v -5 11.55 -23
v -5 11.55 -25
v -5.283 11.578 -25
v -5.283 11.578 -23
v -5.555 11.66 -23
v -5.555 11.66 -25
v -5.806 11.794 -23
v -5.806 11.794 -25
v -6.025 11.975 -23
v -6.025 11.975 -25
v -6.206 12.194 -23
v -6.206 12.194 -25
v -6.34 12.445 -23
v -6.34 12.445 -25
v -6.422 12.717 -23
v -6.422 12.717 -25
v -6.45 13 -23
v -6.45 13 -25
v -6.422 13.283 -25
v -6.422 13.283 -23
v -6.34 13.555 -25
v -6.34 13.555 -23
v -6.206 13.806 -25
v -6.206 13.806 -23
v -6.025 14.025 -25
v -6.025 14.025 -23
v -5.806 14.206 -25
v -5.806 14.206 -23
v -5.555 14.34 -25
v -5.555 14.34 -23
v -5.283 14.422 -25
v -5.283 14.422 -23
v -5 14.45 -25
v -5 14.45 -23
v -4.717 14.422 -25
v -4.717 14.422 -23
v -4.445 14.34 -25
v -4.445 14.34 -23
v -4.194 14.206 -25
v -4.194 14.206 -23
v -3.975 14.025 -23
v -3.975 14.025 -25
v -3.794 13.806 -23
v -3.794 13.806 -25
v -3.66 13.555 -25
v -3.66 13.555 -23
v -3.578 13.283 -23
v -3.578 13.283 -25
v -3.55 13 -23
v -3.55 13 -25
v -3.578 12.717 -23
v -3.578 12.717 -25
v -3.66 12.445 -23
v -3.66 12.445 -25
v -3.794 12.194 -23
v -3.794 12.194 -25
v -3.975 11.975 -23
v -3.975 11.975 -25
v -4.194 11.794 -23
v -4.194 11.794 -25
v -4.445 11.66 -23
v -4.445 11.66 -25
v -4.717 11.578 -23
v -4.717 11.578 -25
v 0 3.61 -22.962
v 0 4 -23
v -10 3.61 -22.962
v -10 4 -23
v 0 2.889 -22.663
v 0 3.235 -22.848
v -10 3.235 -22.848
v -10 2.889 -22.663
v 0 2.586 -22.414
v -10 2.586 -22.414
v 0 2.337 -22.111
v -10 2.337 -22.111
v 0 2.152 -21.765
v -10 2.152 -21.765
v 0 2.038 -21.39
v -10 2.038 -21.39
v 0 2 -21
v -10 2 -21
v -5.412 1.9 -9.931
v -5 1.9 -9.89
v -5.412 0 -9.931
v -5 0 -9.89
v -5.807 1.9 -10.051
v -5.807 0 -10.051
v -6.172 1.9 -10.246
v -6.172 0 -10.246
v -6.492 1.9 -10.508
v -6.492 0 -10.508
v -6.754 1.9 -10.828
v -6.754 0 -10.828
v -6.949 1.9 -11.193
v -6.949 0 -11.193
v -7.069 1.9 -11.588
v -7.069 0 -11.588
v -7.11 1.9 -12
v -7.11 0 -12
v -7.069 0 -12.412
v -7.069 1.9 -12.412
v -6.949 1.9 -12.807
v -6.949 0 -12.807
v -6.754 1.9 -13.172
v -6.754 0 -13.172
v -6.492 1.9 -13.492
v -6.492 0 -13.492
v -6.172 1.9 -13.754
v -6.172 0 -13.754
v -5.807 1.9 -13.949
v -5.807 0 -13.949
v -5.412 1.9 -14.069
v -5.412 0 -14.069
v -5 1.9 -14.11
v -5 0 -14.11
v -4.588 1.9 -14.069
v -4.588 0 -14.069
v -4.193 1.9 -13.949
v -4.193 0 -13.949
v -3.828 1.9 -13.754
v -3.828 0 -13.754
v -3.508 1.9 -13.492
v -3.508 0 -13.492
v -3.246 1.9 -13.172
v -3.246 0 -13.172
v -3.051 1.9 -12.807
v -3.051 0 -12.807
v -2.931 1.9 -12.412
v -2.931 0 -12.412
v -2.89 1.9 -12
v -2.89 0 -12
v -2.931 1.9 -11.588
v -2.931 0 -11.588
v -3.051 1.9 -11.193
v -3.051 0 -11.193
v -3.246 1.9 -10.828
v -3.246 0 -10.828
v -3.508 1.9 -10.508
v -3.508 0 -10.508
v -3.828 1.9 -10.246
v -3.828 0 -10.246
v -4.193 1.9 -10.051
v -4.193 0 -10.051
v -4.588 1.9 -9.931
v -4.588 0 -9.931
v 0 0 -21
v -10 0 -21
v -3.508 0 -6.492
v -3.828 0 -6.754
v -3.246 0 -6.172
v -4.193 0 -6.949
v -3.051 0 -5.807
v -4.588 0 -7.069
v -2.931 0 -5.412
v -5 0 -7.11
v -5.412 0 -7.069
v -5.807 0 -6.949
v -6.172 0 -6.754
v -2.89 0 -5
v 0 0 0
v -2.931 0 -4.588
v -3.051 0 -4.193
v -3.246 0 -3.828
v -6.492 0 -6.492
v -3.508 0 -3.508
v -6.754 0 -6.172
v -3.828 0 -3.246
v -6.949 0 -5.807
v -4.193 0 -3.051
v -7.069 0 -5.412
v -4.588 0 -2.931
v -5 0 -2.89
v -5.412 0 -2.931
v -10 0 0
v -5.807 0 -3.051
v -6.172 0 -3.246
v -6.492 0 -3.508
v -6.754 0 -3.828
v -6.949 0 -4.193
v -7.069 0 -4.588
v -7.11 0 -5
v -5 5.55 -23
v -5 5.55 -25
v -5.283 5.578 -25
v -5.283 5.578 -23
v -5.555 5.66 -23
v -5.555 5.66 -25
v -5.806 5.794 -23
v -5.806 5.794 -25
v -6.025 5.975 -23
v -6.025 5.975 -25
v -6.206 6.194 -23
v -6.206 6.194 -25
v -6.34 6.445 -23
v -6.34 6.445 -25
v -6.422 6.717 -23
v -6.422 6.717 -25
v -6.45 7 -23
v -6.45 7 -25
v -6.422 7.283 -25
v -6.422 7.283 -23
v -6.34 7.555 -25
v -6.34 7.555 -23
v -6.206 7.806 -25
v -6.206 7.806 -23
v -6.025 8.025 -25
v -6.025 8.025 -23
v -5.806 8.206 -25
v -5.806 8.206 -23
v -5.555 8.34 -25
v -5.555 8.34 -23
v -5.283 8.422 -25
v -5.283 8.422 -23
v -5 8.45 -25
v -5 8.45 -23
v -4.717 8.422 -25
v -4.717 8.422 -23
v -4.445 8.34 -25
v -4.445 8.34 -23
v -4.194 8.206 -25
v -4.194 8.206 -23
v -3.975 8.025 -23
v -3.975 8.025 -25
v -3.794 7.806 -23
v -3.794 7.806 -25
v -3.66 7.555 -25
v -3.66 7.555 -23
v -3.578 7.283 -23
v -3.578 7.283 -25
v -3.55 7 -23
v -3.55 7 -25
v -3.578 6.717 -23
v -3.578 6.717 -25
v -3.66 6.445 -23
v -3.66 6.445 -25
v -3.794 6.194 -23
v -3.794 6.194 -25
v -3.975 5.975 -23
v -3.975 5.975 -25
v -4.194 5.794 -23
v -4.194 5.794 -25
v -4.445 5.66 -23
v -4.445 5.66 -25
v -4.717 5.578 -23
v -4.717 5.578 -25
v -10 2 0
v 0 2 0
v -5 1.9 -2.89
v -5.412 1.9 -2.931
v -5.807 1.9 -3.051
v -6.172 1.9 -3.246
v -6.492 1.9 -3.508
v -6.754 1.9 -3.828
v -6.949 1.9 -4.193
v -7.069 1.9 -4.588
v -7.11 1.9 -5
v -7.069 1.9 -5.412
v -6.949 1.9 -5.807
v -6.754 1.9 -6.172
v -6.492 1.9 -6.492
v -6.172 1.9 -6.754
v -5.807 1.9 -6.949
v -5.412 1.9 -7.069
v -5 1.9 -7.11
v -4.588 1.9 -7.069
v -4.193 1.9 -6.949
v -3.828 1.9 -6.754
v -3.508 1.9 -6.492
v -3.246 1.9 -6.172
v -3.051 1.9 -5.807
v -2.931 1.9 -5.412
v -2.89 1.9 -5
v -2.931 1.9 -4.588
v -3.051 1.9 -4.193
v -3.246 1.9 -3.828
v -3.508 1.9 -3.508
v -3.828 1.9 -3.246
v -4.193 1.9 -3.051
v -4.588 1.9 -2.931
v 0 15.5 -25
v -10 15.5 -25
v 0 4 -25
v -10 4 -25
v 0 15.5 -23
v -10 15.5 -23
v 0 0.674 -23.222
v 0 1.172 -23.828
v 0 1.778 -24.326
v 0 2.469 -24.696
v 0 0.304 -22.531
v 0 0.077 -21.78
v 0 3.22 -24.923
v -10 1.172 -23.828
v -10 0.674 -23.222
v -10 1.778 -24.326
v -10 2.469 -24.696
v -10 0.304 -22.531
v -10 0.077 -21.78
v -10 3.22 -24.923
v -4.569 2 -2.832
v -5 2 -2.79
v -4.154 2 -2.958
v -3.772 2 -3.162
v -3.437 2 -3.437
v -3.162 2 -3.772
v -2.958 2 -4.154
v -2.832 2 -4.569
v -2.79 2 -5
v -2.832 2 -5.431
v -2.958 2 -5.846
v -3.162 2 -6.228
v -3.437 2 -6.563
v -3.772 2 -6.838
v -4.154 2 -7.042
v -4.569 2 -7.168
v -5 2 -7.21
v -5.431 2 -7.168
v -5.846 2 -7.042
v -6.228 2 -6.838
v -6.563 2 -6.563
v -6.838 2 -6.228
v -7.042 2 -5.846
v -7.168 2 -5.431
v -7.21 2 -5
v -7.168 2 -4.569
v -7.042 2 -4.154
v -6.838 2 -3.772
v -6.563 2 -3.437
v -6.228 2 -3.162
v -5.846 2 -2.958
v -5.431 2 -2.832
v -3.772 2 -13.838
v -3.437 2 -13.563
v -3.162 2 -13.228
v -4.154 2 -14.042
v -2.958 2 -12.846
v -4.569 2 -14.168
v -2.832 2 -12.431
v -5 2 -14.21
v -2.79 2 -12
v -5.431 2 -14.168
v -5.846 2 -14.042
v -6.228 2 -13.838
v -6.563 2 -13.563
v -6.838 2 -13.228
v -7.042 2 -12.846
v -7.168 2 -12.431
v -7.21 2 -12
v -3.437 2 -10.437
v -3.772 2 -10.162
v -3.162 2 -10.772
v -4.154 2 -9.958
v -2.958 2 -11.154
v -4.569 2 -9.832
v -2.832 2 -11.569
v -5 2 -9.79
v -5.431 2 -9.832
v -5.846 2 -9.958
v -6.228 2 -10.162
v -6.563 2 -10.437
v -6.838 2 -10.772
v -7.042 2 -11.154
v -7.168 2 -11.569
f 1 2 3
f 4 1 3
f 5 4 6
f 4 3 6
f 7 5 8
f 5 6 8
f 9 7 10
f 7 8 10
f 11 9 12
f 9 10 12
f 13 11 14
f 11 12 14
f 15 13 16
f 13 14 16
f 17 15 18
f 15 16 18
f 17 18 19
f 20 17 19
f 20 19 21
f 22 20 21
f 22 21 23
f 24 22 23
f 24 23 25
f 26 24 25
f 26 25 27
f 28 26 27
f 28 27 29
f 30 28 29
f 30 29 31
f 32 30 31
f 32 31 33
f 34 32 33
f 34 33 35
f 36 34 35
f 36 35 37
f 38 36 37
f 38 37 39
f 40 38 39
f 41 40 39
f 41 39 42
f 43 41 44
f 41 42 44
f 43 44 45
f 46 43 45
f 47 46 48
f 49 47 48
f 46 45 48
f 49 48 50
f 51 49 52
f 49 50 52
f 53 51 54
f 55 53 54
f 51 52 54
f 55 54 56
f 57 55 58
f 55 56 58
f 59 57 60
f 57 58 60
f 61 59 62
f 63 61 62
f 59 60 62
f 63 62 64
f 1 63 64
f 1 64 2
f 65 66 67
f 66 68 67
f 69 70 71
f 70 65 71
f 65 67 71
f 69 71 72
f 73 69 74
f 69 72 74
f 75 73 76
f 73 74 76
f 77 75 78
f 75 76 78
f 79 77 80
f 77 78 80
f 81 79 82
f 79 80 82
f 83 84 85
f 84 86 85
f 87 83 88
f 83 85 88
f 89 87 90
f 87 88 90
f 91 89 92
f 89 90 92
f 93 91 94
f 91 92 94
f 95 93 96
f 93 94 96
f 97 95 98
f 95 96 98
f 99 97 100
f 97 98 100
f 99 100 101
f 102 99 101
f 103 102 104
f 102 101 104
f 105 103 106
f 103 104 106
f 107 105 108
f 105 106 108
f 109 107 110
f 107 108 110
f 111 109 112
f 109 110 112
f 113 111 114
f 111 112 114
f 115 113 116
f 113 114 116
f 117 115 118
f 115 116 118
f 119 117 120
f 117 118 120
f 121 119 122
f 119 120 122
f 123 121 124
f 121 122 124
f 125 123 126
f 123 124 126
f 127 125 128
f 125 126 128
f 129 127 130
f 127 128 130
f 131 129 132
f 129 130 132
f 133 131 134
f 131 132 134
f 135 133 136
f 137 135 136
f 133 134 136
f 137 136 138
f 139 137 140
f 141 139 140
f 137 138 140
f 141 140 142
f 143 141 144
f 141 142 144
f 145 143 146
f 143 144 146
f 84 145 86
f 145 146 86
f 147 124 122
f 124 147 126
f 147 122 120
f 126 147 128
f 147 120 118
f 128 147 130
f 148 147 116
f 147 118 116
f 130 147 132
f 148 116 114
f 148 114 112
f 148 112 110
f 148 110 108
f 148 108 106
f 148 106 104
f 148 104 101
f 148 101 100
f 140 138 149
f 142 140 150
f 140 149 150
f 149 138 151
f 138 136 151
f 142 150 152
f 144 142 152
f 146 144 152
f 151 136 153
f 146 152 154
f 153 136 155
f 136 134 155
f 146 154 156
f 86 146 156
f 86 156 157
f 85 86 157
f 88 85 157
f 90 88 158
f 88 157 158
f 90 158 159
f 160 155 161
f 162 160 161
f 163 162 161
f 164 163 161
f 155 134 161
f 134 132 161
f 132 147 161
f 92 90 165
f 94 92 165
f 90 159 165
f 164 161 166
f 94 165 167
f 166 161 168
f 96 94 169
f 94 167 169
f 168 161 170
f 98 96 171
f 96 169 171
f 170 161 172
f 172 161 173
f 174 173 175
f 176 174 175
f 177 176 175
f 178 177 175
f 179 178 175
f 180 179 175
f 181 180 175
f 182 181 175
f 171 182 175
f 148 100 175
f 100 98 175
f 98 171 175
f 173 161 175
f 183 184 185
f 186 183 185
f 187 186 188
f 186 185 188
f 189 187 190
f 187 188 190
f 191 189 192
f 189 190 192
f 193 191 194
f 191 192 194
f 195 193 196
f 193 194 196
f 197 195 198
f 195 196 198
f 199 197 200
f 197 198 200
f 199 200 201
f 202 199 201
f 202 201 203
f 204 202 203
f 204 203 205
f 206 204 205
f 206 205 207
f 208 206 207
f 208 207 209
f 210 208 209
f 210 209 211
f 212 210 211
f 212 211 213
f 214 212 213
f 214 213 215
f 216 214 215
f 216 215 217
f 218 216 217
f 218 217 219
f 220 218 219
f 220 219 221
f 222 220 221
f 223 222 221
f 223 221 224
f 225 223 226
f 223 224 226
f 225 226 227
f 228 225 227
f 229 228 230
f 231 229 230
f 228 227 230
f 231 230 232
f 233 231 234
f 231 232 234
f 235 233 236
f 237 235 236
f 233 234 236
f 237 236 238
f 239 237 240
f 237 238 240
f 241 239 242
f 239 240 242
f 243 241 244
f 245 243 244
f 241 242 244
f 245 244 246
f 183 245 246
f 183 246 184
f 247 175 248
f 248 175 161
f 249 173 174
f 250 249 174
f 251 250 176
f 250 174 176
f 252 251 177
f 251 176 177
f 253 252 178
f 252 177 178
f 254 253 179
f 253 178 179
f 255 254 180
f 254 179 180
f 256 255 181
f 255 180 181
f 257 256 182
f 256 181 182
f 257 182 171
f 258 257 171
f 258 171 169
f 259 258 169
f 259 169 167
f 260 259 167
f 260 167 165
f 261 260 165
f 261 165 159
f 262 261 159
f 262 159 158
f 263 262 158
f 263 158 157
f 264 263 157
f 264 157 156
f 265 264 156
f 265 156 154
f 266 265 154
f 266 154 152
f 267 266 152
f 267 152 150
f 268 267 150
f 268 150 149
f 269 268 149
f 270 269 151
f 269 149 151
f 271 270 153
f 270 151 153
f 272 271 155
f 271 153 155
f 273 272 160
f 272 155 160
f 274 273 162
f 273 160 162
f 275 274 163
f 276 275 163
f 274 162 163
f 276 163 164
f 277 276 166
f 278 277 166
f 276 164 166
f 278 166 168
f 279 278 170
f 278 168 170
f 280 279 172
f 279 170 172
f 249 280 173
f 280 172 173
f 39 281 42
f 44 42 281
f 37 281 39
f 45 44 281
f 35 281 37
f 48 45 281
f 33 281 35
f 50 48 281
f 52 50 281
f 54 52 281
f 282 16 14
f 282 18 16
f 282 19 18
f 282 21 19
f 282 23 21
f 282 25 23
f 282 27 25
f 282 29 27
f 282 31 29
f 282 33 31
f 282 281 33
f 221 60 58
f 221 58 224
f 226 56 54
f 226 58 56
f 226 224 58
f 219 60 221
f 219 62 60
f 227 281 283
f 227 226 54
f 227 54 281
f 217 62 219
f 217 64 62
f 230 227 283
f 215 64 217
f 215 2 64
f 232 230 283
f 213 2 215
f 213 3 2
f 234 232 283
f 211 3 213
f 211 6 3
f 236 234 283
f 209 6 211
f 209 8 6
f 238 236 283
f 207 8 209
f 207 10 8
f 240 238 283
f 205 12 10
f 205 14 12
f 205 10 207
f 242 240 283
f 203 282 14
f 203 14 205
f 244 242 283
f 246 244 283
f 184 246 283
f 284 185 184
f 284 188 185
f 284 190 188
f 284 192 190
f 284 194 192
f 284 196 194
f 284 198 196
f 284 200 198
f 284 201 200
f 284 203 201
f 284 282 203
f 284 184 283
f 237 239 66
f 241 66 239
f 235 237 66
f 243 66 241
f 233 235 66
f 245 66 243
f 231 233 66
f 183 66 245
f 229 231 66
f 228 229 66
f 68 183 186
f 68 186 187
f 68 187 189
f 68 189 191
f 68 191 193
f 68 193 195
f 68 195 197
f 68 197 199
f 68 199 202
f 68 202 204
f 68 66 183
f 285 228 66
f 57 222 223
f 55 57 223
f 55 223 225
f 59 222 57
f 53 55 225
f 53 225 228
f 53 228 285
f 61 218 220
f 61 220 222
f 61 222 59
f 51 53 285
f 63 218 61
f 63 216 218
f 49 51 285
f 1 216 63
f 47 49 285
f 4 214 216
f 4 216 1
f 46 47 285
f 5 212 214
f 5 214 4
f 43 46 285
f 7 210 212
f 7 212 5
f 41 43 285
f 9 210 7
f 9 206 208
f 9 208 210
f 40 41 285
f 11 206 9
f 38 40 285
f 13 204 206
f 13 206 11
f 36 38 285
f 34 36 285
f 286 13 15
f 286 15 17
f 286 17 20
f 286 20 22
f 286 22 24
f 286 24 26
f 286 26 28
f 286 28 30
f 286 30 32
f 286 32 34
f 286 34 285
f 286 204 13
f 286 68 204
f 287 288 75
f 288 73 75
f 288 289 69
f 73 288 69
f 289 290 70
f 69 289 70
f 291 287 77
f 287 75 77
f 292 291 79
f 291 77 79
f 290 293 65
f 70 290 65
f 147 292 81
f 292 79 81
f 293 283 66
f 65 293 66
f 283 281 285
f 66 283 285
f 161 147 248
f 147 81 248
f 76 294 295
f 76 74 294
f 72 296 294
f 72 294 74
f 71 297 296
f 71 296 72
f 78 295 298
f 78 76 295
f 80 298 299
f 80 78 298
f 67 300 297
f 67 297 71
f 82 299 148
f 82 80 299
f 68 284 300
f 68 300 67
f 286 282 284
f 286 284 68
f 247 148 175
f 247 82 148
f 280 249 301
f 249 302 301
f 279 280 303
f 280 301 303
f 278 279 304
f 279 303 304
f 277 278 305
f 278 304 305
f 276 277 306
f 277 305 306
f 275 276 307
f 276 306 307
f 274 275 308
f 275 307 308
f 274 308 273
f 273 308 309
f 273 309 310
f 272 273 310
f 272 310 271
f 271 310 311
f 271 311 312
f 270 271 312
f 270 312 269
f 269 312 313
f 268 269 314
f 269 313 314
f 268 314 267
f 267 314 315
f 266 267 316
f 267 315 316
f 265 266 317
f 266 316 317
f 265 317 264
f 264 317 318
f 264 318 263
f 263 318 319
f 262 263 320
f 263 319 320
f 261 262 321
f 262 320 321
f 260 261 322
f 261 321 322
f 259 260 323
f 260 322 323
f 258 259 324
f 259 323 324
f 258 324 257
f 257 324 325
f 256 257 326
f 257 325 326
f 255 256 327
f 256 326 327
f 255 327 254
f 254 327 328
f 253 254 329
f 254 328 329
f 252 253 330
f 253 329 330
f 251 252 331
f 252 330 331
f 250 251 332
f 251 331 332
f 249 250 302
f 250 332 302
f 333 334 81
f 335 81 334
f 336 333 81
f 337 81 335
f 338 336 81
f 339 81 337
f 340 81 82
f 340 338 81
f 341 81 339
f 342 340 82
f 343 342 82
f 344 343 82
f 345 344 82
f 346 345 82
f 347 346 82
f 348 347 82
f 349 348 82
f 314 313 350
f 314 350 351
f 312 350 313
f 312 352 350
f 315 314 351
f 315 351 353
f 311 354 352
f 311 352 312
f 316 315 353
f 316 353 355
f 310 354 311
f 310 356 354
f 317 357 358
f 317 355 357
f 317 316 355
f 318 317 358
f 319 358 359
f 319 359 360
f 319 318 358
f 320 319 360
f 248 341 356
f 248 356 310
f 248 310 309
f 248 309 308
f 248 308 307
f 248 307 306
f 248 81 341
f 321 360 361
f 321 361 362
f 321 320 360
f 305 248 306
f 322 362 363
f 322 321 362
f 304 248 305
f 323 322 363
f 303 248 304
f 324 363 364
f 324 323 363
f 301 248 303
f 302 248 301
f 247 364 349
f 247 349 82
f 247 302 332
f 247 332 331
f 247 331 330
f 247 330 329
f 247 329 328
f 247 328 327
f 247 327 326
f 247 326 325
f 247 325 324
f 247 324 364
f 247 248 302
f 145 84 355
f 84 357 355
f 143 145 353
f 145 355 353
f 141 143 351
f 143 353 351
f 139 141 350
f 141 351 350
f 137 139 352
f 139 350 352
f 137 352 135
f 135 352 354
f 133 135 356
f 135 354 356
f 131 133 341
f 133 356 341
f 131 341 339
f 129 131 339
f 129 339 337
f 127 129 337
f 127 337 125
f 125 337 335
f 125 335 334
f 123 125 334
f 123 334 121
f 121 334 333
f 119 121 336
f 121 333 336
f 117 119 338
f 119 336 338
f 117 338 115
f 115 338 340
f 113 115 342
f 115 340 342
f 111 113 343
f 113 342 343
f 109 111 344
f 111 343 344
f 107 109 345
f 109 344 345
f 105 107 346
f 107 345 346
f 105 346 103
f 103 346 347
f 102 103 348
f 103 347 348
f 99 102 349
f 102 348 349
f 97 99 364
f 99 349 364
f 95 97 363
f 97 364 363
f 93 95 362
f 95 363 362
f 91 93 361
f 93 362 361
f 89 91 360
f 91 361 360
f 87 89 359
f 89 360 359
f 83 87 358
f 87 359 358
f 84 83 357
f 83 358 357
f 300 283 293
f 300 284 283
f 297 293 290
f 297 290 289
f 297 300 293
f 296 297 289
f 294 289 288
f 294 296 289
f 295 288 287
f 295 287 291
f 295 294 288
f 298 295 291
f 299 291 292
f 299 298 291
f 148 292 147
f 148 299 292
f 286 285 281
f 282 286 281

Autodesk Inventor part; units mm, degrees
ref_plane "YZ Plane" through (0, 0, 0) normal (1, 0, 0) x (0, 1, 0)
ref_plane "XZ Plane" through (0, 0, 0) normal (0, 1, 0) x (-1, 0, 0)
ref_plane "XY Plane" through (0, 0, 0) normal (0, 0, 1) x (1, 0, 0)
sketch "Szkic1" plane through (0, 0, 0) normal (0, 1, 0) x (-1, 0, 0)
  line L0 (10, 0) -> (0, 0)
  line L1 (0, 0) -> (0, -25)
  line L2 (0, -25) -> (10, -25)
  line L3 (10, -25) -> (10, 0)
  dimension "d0" = 25
  dimension "d1" = 10
  dimension "d13" = 0
  dimension "d14" = 0
extrude "Płyta1" add sketch "Szkic1" along normal blind 2
sketch "Szkic2" plane through (-10, 0, -23) normal (0, 0, -1) x (-1, 0, 0)
  line L0 (-10, 0) -> (0, 0)
  line L1 (0, 0) -> (0, 15.5)
  line L2 (0, 15.5) -> (-10, 15.5)
  line L3 (-10, 15.5) -> (-10, 0)
edge flange "Kołnierz1" height 15.5 angle 90 thickness 2 bend radius 2 thickness toward (0, 0, -1) relief tear relief width 2 relief depth 1 edges at (-5, 2, -25) wall of the first edge with corners at (0, 0, -23) (-10, 0, -23) (-10, 15.5, -23) (0, 15.5, -23)
bend "Zagięcie1"
corner "Narożnik1"
sketch "Szkic4" plane through (0, 2, 0) normal (0, 1, 0) x (1, 0, 0)
  line L0 (-10, 0) -> (-10, 21) projected
  line L1 (0, 0) -> (-10, 0) projected
  point P0 (-5, 5)
  point P1 (-5, 12)
  dimension "d48" = 5
  dimension "d49" = 7
sketch "Szkic5" plane through (-10, 15.5, -23) normal (0, 0, 1) x (1, 0, 0)
  line L0 (10, 0) -> (0, 0) projected
  line L1 (0, 0) -> (0, -11.5) projected
  point P0 (10, -15.5)
  point P1 (5, -8.5)
  point P2 (5, -2.5)
  dimension "d50" = 6
  dimension "d51" = 2.5
hole "Otwór1" at (-5, 7, -23) at (-5, 13, -23) direction (0, 0, -1) diameter 2.9 end through all clearance for "Wkręt z łbem walcowym gniazdowym ISO 4762" size "M2.5" standard "ISO"
hole "Otwór2" at (-5, 2, -5) at (-5, 2, -12) direction (0, -1, 0) diameter 4.22 end through all
chamfer "Faza1" distance 0.1 angle 45 2 edges at (-5, 2, -7.11) (-5, 2, -14.11)
equation "\"d36\" = Grubość"
equation "\"d43\" = Grubość"
equation "\"d2\" = Grubość"
equation "\"d3\" = SzerokośćGięciaPodcięcia"
equation "\"d4\" = GłębokośćGięciaPodcięcia"
equation "\"d5\" = MinimalnaPozostałość"
equation "\"d6\" = PromieńPrzejścia"
equation "\"d9\" = PromieńGięcia"
equation "\"d10\" = RozmiarPodcięciaNarożnika"
equation "\"d11\" = Wielk_odstępu"
equation "\"d12\" = Rozmiar_promienia_Jacobiego"
equation "\"PromieńGięcia\" = Grubość"
equation "\"SzerokośćGięciaPodcięcia\" = Grubość"
equation "\"GłębokośćGięciaPodcięcia\" = 0.5 * Grubość"
equation "\"RozmiarPodcięciaNarożnika\" = 4 * Grubość"
equation "\"MinimalnaPozostałość\" = 2 * Grubość"
equation "\"PromieńPrzejścia\" = PromieńGięcia"
equation "\"Rozmiar_promienia_Jacobiego\" = PromieńGięcia"
equation "\"Wielk_odstępu\" = Grubość"
equation "\"Grubość\" = 2"
properties material "Aluminium 6061"
